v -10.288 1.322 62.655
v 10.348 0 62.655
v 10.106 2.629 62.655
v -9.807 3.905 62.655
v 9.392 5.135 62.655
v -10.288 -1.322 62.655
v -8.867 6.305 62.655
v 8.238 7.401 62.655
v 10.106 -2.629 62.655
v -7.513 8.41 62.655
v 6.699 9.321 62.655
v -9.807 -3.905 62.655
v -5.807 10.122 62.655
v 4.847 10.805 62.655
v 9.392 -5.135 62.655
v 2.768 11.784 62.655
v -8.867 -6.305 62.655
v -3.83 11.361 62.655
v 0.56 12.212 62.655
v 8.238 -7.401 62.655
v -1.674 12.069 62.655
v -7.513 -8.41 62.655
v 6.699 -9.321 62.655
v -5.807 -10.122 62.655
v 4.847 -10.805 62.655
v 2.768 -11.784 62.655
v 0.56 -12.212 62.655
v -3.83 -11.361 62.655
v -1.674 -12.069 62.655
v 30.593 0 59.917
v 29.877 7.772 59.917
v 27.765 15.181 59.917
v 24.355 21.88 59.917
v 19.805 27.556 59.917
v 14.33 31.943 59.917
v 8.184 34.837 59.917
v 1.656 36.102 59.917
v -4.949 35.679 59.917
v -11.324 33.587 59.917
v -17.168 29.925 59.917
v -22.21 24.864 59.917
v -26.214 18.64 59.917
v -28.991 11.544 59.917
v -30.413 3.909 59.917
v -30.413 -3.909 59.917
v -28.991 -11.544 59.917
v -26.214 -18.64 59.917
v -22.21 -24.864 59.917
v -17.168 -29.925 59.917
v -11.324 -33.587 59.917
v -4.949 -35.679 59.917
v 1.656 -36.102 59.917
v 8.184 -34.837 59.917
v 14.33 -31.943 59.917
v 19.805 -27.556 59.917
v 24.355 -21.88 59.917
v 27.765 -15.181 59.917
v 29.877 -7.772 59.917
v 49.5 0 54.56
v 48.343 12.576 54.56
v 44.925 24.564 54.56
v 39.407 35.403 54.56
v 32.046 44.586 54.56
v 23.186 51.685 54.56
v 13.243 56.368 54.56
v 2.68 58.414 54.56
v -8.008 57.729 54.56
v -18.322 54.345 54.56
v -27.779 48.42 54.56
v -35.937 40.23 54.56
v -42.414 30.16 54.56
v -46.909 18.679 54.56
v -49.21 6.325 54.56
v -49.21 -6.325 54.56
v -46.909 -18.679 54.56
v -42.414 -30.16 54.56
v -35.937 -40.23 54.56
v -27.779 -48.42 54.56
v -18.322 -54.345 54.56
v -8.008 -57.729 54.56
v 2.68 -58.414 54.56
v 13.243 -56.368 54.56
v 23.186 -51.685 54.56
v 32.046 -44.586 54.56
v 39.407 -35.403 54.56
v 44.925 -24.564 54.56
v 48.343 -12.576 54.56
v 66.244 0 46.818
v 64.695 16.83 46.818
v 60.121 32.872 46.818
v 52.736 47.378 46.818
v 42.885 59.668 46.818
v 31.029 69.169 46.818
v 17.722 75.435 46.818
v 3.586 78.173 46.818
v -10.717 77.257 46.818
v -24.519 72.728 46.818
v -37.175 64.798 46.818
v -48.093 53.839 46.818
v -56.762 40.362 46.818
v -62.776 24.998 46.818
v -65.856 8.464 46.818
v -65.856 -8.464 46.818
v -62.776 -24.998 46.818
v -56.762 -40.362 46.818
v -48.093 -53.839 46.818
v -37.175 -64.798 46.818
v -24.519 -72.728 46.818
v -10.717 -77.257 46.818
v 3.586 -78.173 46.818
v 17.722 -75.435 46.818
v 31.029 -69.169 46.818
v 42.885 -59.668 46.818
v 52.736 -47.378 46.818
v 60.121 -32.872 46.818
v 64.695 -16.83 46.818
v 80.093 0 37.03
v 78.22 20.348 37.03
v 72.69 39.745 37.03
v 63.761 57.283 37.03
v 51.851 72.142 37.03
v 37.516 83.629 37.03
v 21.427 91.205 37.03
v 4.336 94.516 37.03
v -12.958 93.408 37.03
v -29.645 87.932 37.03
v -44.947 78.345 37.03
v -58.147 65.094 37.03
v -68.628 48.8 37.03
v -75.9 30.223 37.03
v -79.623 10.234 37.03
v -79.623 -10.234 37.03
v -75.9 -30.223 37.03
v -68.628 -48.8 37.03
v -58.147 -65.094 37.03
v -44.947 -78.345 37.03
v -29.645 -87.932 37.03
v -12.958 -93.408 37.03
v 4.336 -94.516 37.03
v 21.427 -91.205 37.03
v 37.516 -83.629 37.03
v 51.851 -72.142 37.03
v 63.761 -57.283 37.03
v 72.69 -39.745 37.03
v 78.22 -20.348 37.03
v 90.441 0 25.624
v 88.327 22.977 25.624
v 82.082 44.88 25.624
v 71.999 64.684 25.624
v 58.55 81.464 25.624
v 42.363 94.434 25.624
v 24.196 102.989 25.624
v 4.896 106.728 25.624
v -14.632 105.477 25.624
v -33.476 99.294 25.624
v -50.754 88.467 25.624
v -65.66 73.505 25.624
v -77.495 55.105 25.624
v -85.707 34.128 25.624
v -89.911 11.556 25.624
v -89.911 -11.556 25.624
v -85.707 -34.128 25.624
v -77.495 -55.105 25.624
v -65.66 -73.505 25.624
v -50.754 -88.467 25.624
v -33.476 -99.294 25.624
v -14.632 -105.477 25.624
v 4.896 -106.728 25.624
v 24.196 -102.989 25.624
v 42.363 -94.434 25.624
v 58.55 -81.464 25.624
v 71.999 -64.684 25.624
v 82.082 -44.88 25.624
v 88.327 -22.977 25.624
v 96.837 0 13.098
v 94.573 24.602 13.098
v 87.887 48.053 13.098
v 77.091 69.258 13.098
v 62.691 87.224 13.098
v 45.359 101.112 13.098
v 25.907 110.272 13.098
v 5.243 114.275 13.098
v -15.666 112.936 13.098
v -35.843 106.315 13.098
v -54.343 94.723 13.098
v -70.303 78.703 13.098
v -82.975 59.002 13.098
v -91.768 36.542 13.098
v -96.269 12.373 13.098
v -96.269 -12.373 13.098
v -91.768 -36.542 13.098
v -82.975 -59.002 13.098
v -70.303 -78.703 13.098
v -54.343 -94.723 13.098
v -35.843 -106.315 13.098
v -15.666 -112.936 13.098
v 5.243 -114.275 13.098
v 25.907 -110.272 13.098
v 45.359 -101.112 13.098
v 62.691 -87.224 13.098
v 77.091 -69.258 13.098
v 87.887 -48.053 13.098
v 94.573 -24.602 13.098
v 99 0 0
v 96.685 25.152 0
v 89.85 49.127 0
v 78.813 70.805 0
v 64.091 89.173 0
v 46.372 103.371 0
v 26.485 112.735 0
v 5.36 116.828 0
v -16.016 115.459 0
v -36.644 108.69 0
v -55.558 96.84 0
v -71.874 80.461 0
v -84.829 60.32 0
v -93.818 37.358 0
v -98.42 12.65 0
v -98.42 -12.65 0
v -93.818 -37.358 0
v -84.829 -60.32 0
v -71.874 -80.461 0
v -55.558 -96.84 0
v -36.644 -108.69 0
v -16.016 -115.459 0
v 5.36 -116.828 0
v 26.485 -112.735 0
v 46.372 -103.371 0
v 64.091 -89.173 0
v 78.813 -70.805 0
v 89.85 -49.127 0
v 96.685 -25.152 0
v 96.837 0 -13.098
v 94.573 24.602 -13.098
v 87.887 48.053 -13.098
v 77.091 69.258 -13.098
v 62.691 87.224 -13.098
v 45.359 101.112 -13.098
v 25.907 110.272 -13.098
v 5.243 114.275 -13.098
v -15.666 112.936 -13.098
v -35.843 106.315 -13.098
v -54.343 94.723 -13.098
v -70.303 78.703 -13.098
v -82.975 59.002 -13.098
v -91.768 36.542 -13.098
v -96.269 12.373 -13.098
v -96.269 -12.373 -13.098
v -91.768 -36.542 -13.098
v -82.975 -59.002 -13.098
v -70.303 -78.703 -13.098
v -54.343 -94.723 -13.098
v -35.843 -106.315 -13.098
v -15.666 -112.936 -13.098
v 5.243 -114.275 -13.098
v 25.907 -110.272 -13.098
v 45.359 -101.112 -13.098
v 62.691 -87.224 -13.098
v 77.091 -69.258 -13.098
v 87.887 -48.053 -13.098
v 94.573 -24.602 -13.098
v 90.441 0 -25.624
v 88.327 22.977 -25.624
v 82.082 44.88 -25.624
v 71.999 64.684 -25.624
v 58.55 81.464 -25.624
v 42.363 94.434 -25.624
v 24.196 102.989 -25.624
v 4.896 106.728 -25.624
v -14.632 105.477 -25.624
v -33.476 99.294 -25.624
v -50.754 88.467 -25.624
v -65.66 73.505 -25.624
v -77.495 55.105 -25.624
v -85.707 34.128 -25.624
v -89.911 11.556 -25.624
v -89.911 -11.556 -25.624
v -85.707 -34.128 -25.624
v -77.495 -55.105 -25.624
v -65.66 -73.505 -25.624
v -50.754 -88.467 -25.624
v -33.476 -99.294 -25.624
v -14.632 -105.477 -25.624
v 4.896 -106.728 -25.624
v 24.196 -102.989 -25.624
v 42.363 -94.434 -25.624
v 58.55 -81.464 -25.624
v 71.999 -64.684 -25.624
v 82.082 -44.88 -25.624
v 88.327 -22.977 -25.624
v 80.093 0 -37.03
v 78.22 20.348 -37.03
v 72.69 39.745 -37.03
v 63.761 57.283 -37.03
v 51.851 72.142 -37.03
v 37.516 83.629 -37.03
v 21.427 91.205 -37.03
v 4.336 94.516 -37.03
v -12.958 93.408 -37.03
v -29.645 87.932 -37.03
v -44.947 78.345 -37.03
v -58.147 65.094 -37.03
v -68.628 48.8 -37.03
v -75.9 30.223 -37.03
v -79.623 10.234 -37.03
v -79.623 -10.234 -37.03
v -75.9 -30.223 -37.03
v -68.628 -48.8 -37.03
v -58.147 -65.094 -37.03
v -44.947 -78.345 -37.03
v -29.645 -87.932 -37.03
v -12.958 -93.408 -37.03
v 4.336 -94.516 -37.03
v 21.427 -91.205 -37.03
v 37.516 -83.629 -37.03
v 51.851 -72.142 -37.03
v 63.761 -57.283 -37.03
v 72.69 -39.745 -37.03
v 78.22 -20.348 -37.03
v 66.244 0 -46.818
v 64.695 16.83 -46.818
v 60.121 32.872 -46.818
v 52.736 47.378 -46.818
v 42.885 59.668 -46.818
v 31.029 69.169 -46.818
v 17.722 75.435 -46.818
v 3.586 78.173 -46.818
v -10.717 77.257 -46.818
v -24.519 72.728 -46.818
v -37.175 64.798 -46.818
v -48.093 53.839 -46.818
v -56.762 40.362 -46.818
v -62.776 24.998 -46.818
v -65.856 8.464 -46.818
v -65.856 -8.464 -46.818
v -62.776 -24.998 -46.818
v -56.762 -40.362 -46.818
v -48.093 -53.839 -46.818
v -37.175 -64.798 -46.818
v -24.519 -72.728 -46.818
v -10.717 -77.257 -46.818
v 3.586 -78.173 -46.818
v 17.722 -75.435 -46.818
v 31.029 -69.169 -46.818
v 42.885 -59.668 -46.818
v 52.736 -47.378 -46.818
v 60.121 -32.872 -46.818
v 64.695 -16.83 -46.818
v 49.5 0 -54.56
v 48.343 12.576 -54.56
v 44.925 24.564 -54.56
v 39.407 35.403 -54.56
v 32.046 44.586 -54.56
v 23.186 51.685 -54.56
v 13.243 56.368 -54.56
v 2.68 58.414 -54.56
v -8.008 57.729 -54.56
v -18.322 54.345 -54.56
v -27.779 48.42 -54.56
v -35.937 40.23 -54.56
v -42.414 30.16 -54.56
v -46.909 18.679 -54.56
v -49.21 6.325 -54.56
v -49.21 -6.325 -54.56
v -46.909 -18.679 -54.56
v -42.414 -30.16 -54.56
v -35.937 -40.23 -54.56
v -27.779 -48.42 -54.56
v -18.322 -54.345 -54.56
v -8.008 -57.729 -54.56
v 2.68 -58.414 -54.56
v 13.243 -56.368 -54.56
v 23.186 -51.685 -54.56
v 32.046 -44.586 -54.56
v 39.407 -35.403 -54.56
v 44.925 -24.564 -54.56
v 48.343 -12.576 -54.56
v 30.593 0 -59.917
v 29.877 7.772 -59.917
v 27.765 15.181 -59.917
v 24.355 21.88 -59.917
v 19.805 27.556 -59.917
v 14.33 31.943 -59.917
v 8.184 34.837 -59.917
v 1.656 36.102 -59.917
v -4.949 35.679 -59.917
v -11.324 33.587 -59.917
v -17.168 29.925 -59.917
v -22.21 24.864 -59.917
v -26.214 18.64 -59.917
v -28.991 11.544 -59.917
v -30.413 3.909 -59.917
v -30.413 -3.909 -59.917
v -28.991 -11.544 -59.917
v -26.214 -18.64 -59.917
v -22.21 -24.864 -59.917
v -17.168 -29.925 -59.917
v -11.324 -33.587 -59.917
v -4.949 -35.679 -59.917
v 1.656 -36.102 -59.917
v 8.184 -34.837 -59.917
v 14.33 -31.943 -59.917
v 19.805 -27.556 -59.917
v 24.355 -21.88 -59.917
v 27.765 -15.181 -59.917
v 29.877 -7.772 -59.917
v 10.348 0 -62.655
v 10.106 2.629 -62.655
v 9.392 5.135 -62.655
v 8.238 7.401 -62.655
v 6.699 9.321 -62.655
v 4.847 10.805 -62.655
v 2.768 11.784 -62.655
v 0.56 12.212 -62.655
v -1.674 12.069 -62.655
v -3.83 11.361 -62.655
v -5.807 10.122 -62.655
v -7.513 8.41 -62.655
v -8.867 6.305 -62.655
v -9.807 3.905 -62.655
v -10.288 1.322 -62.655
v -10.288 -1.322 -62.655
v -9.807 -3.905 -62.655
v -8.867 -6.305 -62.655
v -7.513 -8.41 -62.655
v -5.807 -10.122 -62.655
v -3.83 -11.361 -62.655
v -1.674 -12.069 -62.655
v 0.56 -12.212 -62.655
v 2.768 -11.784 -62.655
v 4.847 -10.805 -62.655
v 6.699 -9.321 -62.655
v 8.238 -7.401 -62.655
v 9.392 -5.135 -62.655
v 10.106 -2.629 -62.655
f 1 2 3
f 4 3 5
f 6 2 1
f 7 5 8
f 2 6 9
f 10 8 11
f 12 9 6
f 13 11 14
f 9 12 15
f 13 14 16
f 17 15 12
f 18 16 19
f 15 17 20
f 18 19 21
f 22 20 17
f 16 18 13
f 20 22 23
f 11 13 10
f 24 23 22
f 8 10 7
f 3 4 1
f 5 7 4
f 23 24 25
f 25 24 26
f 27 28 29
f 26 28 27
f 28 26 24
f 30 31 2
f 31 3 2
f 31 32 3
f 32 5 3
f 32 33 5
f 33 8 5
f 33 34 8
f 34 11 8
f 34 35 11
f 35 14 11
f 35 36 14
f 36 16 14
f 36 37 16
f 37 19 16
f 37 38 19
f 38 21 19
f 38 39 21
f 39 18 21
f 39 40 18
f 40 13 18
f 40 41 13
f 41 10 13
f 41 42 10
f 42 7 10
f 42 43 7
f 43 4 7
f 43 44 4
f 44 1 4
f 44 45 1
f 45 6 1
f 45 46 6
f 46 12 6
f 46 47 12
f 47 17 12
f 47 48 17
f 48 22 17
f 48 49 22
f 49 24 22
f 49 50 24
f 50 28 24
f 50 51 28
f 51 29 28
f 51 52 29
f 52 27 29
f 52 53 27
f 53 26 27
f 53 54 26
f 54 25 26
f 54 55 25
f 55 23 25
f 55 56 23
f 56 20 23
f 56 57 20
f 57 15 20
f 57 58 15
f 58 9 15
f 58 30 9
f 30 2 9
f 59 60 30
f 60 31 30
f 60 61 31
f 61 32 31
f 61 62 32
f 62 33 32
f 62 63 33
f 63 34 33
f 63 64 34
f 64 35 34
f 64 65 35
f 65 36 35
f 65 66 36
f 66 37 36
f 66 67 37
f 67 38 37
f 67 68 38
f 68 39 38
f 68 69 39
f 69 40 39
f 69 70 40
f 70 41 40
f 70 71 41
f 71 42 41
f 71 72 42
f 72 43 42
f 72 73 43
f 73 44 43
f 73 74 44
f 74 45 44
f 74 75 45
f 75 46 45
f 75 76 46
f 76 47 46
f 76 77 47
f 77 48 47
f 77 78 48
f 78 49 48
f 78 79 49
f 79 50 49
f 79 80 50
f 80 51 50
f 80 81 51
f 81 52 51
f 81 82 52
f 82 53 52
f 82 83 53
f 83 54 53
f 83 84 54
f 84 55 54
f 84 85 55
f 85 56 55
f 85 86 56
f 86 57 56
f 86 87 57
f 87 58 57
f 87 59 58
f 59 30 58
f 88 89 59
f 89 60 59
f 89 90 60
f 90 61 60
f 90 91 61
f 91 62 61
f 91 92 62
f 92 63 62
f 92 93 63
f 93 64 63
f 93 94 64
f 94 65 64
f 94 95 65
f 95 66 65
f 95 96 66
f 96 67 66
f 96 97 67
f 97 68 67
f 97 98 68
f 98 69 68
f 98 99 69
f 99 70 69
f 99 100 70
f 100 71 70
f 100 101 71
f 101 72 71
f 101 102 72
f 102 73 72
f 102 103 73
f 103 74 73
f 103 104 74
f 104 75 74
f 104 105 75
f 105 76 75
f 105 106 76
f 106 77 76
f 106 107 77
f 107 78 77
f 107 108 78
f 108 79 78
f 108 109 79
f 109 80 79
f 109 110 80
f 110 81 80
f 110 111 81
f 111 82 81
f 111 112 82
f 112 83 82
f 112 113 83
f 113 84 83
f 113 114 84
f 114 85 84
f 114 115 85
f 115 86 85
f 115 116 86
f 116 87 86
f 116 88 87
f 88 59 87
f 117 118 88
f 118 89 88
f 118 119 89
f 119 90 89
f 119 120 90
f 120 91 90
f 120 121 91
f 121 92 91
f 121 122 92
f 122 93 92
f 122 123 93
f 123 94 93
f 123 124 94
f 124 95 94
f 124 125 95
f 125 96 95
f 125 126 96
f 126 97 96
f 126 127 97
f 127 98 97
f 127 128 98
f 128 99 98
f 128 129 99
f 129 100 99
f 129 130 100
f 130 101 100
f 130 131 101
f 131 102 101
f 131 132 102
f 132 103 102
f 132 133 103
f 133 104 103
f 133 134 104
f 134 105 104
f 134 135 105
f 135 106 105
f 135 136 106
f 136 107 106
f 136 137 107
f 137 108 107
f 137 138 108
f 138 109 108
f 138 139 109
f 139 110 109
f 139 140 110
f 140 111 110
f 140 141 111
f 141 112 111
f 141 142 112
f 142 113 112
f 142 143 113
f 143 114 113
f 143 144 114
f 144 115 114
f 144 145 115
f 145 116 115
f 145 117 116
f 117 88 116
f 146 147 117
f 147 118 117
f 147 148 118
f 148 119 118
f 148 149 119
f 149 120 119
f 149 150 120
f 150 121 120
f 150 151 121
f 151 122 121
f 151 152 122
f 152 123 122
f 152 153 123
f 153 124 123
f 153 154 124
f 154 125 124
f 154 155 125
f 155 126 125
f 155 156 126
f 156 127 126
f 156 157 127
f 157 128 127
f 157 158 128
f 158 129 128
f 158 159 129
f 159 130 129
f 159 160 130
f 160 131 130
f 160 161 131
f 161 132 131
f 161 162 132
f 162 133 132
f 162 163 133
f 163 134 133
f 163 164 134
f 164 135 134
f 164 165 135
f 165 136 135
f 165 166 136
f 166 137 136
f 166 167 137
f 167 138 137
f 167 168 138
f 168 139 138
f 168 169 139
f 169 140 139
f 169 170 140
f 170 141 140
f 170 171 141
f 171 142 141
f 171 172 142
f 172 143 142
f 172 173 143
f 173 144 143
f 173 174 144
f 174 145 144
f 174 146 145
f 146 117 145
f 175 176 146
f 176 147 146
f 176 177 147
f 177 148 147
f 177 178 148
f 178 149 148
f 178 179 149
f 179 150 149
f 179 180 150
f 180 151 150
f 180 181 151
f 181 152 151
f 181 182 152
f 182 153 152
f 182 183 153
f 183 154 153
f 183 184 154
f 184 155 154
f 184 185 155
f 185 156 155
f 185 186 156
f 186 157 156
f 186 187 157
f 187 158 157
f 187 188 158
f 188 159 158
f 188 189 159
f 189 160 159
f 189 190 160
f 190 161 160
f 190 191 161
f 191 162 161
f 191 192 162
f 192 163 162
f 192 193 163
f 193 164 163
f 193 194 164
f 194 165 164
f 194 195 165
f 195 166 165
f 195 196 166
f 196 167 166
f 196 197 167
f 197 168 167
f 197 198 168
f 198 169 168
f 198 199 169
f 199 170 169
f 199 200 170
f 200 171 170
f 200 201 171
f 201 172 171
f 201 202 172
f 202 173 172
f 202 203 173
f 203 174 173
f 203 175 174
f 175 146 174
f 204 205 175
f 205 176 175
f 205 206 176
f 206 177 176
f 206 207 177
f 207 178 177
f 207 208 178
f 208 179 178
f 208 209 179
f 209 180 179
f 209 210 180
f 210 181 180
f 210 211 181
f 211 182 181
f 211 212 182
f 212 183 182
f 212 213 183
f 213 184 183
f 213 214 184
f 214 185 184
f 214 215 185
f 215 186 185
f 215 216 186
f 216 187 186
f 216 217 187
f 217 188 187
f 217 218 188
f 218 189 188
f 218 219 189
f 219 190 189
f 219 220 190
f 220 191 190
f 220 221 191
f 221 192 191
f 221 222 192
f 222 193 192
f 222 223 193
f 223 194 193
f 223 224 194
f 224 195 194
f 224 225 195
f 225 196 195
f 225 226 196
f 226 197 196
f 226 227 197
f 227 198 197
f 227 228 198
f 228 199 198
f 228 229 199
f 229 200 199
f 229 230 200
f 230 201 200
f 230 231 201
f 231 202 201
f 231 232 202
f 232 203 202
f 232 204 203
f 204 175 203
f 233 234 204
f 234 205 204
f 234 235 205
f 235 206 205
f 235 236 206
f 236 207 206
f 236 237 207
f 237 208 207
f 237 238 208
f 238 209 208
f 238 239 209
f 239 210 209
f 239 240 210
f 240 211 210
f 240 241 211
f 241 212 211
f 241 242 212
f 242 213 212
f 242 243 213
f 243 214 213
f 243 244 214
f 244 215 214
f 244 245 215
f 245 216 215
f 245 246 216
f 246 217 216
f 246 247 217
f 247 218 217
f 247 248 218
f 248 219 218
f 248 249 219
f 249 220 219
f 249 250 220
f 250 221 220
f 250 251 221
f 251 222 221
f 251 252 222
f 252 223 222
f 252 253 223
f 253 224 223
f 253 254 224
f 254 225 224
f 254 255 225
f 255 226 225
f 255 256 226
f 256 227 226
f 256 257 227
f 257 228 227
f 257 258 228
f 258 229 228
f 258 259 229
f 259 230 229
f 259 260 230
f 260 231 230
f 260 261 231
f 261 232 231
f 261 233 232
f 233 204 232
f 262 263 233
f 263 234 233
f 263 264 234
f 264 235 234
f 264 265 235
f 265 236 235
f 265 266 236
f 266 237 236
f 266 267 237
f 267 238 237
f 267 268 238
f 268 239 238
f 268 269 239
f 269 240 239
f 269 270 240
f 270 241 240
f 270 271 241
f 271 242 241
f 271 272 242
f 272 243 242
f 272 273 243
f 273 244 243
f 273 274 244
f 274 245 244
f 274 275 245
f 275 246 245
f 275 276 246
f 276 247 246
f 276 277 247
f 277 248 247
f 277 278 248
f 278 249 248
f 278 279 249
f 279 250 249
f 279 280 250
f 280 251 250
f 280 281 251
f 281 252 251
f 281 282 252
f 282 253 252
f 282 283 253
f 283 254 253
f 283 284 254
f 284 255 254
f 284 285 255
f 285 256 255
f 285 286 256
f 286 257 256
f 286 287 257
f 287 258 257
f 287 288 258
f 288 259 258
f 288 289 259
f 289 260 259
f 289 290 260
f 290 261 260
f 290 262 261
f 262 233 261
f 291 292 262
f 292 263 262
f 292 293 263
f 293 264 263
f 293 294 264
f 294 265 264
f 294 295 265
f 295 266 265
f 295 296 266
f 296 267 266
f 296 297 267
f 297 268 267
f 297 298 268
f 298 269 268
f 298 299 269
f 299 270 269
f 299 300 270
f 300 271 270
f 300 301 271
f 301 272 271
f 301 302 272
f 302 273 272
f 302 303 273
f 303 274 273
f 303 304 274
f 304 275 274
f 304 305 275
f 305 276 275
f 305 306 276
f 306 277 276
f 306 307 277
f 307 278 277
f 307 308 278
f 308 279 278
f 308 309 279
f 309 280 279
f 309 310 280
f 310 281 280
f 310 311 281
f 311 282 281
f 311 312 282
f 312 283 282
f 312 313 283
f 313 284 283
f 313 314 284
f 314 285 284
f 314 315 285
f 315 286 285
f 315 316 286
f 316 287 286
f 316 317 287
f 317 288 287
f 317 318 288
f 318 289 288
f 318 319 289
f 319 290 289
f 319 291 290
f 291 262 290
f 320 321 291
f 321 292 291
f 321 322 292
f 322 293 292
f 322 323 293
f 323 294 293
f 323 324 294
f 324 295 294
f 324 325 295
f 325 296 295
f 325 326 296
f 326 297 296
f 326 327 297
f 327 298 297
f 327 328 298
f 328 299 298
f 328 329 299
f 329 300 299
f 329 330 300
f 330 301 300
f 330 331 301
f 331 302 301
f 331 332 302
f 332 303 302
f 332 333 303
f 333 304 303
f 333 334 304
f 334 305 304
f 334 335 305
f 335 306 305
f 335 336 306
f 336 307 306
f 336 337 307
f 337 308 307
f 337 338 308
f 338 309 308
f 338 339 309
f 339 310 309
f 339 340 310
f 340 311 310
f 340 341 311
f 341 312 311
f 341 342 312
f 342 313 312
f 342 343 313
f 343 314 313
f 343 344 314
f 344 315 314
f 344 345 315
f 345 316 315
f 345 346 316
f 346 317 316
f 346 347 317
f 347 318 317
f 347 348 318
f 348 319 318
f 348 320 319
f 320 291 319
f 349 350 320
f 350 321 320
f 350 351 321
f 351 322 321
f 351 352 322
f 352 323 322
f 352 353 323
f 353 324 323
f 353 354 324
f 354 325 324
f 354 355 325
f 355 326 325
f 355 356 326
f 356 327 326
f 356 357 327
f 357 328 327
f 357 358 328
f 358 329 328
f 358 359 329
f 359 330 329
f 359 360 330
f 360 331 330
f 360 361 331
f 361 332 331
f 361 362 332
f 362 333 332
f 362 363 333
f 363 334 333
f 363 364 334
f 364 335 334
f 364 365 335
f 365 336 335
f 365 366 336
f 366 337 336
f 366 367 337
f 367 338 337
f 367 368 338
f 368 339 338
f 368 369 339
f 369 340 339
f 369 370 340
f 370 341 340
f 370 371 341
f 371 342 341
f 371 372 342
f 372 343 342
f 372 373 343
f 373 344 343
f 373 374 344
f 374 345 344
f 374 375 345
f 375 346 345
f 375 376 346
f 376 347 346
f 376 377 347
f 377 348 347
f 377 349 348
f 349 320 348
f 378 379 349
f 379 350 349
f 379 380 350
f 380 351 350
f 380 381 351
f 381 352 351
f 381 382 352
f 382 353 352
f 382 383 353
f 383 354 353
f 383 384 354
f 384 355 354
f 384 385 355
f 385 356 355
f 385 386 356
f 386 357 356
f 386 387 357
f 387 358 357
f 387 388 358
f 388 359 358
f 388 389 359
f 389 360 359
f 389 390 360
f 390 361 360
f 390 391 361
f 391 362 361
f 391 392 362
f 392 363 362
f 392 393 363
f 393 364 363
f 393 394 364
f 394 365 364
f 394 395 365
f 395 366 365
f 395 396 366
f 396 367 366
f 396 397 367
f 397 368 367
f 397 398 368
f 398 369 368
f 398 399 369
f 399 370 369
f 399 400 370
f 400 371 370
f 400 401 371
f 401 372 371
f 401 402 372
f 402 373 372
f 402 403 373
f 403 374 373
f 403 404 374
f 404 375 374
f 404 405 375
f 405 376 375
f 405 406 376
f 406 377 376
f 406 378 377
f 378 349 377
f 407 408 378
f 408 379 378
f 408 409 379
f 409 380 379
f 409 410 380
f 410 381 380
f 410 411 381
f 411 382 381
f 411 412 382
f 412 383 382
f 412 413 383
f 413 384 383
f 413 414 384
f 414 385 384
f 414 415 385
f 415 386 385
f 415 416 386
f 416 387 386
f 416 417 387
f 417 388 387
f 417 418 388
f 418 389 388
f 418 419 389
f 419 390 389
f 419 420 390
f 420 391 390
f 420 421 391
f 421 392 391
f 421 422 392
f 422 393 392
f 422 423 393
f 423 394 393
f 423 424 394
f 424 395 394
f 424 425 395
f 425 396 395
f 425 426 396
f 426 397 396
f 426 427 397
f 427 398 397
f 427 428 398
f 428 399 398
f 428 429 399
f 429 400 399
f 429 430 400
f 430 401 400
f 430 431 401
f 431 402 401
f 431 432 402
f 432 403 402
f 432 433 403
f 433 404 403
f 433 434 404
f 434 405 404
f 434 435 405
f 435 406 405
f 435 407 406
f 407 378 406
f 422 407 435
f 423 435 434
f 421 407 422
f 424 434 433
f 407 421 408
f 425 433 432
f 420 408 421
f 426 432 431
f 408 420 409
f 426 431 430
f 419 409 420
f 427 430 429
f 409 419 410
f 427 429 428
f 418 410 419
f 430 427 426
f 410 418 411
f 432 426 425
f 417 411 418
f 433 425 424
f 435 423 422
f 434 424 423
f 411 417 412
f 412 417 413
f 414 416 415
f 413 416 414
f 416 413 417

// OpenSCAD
// Generated by SolidPython 1.0.1 on 2020-07-29 00:46:49


scale(v = [11, 13, 7]) {
	sphere(r = 9);
}
/***********************************************
*********      SolidPython code:      **********
************************************************
 
# import packages: SolidPython
from solid import *
from solid.utils import *
from itertools import chain, combinations, permutations


class Resize:

    def __init__(self, scad_file):
        self.scad_file = scad_file
        #self.scad_file = import_scad(scad_file)
        # cone/cylinder param:
        self.r1 = 0
        self.r2 = 0
        self.h = 0
        # rectangular prism param:
        self.w = 0
        self.l = 0
        # ellipse param:
        self.r = 0

    # import OpenScad code (file name corresponds to shape)


    # classify shape + parameters
    def assign(self, param1, param2, param3):
        if self.scad_file == 'cone.scad':
            self.r1 = param1
            self.r2 = param2
            self.h = param3
        elif self.scad_file == 'cylinder.scad':
            self.r1 = param1
            self.r2 = param2
            self.h = param3
        elif self.scad_file == 'rectangularPrism.scad':
            self.h = param1
            self.l = param2
            self.w = param3
        else:
            self.r = param1
            self.h = param2

    # resize parameters
    def iterate(self):
        x = range(3, 20, 2)
        i = 1
        if self.scad_file == 'cone.scad':
            tempList = list(permutations(x, 2))
            for temp in tempList:
                param1 = temp[0]
                param2 = temp[1]
                filepath = 'produced_scad_files/' + 'cone' + str(param1) + '_' + str(param2) + '_' + '.scad'
                scad_render_to_file(cylinder(h=param1, r1=param2, r2=0), filepath)

        elif self.scad_file == 'cylinder.scad':
            tempList = list(permutations(x, 3))
            for temp in tempList:
                param1 = temp[0]
                param2 = temp[1]
                filepath = 'produced_scad_files/' + 'cylinder' + str(param1) + '_' + str(param2) + '_' + '.scad'
                scad_render_to_file(cylinder(h=param1, r1=param2, r2=param2), filepath)

        elif self.scad_file == 'rectangularPrism.scad':
            tempList = list(permutations(x, 3))
            for temp in tempList:
                param1 = temp[0]
                param2 = temp[1]
                param3 = temp[2]
                filepath = 'produced_scad_files/' + 'rectangularPrism' + str(param1) + '_' + str(param2) + '_' + str(
                    param3) + '.scad'
                scad_render_to_file(cube(size=(param1, param2, param3)), filepath)

        elif self.scad_file == 'ellipse.scad':
            tempList = list(permutations(x, 4))
            for temp in tempList:
                param1 = temp[0]
                param2 = temp[1]
                param3 = temp[2]
                param4 = temp[3]
                filepath = 'produced_scad_files/' + 'ellipse' + str(param1) + '_' + str(param2) + '_' + str(param3) + '_' + str(param4) + '.scad'
                scad_render_to_file(scale([param1, param2, param3])(sphere(r=param4)), filepath)

    def render_to_scadfile(self):
        scad_render_to_file(scad, 'example.scad') 
 
************************************************/
